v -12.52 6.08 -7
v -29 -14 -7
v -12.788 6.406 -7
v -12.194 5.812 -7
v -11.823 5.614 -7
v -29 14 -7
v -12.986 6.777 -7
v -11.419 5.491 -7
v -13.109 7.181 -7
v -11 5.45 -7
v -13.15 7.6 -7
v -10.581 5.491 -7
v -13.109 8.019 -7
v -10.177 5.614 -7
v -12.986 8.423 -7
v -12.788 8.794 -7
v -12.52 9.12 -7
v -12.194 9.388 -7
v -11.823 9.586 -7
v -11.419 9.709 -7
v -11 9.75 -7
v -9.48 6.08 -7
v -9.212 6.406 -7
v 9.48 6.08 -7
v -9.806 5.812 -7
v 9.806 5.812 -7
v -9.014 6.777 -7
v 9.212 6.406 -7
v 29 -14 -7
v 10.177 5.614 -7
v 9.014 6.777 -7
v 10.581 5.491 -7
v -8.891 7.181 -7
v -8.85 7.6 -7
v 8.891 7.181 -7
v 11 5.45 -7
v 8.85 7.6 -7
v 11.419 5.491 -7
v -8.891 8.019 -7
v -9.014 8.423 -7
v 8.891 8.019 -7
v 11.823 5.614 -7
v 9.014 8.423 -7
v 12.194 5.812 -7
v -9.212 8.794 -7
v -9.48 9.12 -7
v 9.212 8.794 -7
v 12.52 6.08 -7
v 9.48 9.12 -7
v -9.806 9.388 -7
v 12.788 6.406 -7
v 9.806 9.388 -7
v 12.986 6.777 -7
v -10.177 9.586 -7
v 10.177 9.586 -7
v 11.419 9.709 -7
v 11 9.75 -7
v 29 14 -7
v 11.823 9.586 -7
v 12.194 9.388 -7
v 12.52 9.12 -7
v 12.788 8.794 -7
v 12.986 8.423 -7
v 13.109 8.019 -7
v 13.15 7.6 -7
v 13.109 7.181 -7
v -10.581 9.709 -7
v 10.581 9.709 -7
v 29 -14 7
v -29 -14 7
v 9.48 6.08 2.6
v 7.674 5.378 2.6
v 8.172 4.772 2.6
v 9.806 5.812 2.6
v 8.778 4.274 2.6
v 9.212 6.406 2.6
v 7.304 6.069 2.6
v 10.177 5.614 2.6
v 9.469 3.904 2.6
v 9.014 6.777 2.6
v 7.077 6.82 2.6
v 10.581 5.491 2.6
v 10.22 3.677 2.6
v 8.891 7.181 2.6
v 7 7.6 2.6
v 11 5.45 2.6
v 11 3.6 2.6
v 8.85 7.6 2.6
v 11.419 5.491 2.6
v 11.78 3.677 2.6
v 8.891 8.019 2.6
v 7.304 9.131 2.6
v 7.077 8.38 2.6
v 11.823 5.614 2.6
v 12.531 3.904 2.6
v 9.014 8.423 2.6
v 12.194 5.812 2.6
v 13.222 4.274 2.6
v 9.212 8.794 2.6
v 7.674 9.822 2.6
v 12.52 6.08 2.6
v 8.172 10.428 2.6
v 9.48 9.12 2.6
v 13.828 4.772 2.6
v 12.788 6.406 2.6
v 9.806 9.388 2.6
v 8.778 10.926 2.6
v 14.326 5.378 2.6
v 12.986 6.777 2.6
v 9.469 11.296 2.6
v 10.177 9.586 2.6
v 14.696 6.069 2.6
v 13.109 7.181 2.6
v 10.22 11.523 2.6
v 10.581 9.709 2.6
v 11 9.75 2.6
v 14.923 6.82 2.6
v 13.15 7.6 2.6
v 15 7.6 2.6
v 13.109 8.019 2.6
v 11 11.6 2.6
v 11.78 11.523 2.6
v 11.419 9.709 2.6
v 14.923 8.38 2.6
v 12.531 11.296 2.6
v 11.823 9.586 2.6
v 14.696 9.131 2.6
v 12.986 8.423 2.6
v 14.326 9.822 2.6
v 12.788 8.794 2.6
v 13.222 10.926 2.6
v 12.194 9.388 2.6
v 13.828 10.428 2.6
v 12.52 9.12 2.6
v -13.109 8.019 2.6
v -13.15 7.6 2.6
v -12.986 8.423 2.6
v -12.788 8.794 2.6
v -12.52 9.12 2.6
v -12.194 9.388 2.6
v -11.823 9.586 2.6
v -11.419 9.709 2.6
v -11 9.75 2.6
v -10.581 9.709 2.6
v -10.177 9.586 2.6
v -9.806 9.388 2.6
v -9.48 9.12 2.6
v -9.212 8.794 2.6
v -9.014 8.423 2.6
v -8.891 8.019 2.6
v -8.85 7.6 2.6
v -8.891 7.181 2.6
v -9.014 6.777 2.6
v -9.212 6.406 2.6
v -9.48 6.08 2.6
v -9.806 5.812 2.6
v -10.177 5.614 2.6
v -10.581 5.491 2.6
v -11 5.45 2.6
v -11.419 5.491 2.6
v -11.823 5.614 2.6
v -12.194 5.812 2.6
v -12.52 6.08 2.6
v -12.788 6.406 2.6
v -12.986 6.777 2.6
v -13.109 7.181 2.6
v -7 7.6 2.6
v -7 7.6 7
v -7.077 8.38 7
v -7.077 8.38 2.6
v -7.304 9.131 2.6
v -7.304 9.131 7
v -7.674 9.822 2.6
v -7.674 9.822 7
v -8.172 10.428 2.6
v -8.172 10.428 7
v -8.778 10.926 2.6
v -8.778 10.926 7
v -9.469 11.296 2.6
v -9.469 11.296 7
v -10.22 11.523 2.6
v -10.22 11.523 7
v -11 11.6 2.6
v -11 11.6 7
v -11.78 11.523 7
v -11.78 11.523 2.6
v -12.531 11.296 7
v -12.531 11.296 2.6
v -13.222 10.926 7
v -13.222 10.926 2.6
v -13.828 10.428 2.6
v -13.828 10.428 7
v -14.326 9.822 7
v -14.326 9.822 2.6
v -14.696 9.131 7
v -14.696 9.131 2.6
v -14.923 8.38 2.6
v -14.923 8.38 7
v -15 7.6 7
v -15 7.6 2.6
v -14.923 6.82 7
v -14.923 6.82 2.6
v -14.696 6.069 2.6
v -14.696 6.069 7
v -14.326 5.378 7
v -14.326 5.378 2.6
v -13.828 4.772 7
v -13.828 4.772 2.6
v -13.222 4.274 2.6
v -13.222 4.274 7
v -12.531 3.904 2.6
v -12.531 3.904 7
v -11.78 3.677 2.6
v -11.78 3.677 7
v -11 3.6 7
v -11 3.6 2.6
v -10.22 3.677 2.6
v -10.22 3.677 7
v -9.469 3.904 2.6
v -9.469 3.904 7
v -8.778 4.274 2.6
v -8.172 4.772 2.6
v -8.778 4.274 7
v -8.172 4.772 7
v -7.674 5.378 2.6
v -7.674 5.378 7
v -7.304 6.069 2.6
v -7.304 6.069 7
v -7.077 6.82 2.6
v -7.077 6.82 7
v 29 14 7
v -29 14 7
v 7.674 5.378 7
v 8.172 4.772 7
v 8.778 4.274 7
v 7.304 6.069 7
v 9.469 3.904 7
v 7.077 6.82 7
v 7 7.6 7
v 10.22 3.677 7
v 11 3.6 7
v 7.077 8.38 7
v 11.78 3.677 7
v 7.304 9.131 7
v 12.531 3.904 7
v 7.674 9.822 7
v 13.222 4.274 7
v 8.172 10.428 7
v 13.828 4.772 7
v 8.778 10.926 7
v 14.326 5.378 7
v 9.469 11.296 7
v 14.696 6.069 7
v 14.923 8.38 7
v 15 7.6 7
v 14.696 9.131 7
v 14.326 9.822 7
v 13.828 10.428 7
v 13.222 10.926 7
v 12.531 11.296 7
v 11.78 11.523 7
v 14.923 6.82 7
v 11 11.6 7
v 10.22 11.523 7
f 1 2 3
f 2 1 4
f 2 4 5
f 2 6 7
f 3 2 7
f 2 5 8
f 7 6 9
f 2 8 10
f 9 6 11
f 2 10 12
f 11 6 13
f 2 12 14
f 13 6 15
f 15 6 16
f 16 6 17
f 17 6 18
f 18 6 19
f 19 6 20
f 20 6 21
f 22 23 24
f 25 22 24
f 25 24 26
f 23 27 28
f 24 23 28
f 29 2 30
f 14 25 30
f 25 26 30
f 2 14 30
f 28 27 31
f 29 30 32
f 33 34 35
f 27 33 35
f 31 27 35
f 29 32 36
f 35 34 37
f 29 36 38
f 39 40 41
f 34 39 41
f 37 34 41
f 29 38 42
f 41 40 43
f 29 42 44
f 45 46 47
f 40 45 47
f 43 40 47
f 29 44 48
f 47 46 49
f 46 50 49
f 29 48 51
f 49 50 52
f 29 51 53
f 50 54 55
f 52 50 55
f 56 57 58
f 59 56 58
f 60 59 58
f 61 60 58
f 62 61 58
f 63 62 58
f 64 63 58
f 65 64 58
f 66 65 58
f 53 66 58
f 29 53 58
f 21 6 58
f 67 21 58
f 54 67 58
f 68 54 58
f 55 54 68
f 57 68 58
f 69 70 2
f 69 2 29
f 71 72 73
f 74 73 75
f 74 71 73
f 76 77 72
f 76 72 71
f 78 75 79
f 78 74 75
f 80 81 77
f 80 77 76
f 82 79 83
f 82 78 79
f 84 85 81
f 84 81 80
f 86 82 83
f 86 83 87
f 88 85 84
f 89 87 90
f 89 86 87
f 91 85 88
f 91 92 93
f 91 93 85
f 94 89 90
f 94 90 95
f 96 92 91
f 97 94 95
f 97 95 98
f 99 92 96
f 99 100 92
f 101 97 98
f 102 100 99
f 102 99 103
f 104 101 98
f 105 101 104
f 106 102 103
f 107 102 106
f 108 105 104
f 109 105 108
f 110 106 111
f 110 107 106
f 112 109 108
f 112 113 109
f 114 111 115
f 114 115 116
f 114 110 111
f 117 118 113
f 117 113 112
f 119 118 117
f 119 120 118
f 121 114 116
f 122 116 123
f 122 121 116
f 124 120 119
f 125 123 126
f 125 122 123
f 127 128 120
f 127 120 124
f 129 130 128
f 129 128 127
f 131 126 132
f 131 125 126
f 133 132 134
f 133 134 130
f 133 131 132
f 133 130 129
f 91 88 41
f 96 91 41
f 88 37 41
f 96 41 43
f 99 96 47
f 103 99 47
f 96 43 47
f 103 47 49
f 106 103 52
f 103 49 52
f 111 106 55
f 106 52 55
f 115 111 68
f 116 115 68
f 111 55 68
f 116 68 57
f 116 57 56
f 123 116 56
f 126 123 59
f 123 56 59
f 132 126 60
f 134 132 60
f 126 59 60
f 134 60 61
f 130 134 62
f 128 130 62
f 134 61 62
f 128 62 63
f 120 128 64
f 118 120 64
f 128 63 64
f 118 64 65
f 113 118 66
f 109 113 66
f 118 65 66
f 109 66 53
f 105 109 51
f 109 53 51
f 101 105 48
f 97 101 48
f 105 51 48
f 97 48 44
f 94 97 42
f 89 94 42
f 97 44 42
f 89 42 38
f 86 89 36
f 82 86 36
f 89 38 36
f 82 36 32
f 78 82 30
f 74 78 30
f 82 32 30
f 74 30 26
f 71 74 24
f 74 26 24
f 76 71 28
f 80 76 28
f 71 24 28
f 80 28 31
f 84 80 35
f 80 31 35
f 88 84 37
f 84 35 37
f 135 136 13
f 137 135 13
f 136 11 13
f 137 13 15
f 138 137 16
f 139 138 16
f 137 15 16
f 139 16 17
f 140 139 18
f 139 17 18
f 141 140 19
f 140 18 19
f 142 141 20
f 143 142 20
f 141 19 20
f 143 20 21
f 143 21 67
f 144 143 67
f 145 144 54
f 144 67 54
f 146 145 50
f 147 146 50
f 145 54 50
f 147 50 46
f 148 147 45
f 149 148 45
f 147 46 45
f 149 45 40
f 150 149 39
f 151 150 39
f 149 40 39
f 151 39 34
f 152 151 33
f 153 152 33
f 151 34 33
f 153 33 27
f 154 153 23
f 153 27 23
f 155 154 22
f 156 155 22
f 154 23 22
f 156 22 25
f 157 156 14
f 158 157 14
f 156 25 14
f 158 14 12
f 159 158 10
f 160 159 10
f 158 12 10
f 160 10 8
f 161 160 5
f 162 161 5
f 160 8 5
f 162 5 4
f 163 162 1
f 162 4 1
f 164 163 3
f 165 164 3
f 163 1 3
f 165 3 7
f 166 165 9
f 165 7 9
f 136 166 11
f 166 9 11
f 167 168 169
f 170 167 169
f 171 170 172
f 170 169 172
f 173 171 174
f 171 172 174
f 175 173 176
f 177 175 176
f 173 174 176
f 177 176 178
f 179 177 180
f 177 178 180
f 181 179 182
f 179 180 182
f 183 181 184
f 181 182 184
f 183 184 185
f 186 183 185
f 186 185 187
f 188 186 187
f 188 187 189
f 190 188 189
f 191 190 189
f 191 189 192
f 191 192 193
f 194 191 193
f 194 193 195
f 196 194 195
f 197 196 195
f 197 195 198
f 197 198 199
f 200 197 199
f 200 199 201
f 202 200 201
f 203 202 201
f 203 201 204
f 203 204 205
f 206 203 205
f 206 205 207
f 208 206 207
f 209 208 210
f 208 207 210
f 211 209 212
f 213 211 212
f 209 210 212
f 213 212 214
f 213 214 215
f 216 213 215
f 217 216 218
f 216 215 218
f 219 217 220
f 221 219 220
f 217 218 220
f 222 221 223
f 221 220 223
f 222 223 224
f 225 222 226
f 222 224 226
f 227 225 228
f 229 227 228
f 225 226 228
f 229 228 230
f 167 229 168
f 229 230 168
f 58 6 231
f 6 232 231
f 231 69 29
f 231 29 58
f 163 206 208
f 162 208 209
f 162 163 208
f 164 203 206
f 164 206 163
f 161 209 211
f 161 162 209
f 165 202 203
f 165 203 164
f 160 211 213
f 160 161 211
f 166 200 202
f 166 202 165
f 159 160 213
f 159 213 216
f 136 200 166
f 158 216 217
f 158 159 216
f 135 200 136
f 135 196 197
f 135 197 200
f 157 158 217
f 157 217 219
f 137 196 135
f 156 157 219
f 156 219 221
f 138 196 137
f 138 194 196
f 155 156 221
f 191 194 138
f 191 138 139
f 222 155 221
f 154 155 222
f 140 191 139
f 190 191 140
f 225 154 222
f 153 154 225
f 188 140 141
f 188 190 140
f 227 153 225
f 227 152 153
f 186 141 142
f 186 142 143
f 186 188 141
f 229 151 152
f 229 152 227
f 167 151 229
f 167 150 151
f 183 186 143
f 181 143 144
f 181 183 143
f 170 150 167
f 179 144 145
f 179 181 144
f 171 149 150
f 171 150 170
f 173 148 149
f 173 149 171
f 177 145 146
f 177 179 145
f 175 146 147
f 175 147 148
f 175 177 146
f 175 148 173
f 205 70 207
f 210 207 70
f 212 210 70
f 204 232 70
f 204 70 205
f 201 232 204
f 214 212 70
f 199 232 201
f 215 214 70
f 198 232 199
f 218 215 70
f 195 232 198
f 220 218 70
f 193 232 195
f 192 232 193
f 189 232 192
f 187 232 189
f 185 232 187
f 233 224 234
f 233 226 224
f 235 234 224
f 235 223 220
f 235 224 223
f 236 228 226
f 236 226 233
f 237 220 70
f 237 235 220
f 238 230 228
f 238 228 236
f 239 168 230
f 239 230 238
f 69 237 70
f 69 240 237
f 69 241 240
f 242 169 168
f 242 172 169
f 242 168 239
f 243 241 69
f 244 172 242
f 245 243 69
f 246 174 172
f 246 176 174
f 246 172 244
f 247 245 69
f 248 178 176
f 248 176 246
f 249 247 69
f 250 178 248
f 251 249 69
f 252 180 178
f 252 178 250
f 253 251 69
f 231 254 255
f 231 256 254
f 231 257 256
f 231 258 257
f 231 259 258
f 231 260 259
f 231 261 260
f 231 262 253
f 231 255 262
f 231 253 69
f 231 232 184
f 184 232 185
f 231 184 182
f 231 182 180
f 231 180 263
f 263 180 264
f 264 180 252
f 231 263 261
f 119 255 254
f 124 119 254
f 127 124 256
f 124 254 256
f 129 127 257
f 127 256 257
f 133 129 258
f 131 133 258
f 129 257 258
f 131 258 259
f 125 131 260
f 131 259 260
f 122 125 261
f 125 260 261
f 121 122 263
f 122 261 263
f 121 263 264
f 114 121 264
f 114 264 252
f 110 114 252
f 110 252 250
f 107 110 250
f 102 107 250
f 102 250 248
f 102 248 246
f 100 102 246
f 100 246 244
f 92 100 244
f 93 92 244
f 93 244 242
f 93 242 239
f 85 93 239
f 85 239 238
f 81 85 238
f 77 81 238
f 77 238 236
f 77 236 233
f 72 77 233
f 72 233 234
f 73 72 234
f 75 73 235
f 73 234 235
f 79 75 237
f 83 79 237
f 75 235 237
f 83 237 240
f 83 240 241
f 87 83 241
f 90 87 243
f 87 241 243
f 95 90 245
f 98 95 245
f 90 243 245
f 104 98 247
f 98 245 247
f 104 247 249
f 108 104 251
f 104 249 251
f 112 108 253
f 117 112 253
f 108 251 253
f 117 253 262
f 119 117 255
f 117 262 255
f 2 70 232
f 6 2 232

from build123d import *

# Parameters (mm, degrees)
SKETCH1_W                                           = 58
SKETCH1_H                                           = 28
BOSS_EXTRUDE1_DEPTH                                 = 7
CBORE_FOR_M4_HEX_SOCKET_HEAD_CAP_SCREW1_D           = 4.3
CBORE_FOR_M4_HEX_SOCKET_HEAD_CAP_SCREW1_CBORE_D     = 8
CBORE_FOR_M4_HEX_SOCKET_HEAD_CAP_SCREW1_CBORE_DEPTH = 4.4


with BuildPart() as part:
    # Sketch1 → Boss-Extrude1 (new, symmetric)
    with BuildSketch(Plane.XY):
        Rectangle(SKETCH1_W, SKETCH1_H)
    extrude(amount=BOSS_EXTRUDE1_DEPTH, both=True)

    # CBORE for M4 Hex Socket Head Cap Screw1 (through all)
    with Locations(Plane.XY.offset(7)):
        with Locations((-11, 7.6), (11, 7.6)):
            CounterBoreHole(CBORE_FOR_M4_HEX_SOCKET_HEAD_CAP_SCREW1_D / 2, CBORE_FOR_M4_HEX_SOCKET_HEAD_CAP_SCREW1_CBORE_D / 2, CBORE_FOR_M4_HEX_SOCKET_HEAD_CAP_SCREW1_CBORE_DEPTH)


solid = part.part
